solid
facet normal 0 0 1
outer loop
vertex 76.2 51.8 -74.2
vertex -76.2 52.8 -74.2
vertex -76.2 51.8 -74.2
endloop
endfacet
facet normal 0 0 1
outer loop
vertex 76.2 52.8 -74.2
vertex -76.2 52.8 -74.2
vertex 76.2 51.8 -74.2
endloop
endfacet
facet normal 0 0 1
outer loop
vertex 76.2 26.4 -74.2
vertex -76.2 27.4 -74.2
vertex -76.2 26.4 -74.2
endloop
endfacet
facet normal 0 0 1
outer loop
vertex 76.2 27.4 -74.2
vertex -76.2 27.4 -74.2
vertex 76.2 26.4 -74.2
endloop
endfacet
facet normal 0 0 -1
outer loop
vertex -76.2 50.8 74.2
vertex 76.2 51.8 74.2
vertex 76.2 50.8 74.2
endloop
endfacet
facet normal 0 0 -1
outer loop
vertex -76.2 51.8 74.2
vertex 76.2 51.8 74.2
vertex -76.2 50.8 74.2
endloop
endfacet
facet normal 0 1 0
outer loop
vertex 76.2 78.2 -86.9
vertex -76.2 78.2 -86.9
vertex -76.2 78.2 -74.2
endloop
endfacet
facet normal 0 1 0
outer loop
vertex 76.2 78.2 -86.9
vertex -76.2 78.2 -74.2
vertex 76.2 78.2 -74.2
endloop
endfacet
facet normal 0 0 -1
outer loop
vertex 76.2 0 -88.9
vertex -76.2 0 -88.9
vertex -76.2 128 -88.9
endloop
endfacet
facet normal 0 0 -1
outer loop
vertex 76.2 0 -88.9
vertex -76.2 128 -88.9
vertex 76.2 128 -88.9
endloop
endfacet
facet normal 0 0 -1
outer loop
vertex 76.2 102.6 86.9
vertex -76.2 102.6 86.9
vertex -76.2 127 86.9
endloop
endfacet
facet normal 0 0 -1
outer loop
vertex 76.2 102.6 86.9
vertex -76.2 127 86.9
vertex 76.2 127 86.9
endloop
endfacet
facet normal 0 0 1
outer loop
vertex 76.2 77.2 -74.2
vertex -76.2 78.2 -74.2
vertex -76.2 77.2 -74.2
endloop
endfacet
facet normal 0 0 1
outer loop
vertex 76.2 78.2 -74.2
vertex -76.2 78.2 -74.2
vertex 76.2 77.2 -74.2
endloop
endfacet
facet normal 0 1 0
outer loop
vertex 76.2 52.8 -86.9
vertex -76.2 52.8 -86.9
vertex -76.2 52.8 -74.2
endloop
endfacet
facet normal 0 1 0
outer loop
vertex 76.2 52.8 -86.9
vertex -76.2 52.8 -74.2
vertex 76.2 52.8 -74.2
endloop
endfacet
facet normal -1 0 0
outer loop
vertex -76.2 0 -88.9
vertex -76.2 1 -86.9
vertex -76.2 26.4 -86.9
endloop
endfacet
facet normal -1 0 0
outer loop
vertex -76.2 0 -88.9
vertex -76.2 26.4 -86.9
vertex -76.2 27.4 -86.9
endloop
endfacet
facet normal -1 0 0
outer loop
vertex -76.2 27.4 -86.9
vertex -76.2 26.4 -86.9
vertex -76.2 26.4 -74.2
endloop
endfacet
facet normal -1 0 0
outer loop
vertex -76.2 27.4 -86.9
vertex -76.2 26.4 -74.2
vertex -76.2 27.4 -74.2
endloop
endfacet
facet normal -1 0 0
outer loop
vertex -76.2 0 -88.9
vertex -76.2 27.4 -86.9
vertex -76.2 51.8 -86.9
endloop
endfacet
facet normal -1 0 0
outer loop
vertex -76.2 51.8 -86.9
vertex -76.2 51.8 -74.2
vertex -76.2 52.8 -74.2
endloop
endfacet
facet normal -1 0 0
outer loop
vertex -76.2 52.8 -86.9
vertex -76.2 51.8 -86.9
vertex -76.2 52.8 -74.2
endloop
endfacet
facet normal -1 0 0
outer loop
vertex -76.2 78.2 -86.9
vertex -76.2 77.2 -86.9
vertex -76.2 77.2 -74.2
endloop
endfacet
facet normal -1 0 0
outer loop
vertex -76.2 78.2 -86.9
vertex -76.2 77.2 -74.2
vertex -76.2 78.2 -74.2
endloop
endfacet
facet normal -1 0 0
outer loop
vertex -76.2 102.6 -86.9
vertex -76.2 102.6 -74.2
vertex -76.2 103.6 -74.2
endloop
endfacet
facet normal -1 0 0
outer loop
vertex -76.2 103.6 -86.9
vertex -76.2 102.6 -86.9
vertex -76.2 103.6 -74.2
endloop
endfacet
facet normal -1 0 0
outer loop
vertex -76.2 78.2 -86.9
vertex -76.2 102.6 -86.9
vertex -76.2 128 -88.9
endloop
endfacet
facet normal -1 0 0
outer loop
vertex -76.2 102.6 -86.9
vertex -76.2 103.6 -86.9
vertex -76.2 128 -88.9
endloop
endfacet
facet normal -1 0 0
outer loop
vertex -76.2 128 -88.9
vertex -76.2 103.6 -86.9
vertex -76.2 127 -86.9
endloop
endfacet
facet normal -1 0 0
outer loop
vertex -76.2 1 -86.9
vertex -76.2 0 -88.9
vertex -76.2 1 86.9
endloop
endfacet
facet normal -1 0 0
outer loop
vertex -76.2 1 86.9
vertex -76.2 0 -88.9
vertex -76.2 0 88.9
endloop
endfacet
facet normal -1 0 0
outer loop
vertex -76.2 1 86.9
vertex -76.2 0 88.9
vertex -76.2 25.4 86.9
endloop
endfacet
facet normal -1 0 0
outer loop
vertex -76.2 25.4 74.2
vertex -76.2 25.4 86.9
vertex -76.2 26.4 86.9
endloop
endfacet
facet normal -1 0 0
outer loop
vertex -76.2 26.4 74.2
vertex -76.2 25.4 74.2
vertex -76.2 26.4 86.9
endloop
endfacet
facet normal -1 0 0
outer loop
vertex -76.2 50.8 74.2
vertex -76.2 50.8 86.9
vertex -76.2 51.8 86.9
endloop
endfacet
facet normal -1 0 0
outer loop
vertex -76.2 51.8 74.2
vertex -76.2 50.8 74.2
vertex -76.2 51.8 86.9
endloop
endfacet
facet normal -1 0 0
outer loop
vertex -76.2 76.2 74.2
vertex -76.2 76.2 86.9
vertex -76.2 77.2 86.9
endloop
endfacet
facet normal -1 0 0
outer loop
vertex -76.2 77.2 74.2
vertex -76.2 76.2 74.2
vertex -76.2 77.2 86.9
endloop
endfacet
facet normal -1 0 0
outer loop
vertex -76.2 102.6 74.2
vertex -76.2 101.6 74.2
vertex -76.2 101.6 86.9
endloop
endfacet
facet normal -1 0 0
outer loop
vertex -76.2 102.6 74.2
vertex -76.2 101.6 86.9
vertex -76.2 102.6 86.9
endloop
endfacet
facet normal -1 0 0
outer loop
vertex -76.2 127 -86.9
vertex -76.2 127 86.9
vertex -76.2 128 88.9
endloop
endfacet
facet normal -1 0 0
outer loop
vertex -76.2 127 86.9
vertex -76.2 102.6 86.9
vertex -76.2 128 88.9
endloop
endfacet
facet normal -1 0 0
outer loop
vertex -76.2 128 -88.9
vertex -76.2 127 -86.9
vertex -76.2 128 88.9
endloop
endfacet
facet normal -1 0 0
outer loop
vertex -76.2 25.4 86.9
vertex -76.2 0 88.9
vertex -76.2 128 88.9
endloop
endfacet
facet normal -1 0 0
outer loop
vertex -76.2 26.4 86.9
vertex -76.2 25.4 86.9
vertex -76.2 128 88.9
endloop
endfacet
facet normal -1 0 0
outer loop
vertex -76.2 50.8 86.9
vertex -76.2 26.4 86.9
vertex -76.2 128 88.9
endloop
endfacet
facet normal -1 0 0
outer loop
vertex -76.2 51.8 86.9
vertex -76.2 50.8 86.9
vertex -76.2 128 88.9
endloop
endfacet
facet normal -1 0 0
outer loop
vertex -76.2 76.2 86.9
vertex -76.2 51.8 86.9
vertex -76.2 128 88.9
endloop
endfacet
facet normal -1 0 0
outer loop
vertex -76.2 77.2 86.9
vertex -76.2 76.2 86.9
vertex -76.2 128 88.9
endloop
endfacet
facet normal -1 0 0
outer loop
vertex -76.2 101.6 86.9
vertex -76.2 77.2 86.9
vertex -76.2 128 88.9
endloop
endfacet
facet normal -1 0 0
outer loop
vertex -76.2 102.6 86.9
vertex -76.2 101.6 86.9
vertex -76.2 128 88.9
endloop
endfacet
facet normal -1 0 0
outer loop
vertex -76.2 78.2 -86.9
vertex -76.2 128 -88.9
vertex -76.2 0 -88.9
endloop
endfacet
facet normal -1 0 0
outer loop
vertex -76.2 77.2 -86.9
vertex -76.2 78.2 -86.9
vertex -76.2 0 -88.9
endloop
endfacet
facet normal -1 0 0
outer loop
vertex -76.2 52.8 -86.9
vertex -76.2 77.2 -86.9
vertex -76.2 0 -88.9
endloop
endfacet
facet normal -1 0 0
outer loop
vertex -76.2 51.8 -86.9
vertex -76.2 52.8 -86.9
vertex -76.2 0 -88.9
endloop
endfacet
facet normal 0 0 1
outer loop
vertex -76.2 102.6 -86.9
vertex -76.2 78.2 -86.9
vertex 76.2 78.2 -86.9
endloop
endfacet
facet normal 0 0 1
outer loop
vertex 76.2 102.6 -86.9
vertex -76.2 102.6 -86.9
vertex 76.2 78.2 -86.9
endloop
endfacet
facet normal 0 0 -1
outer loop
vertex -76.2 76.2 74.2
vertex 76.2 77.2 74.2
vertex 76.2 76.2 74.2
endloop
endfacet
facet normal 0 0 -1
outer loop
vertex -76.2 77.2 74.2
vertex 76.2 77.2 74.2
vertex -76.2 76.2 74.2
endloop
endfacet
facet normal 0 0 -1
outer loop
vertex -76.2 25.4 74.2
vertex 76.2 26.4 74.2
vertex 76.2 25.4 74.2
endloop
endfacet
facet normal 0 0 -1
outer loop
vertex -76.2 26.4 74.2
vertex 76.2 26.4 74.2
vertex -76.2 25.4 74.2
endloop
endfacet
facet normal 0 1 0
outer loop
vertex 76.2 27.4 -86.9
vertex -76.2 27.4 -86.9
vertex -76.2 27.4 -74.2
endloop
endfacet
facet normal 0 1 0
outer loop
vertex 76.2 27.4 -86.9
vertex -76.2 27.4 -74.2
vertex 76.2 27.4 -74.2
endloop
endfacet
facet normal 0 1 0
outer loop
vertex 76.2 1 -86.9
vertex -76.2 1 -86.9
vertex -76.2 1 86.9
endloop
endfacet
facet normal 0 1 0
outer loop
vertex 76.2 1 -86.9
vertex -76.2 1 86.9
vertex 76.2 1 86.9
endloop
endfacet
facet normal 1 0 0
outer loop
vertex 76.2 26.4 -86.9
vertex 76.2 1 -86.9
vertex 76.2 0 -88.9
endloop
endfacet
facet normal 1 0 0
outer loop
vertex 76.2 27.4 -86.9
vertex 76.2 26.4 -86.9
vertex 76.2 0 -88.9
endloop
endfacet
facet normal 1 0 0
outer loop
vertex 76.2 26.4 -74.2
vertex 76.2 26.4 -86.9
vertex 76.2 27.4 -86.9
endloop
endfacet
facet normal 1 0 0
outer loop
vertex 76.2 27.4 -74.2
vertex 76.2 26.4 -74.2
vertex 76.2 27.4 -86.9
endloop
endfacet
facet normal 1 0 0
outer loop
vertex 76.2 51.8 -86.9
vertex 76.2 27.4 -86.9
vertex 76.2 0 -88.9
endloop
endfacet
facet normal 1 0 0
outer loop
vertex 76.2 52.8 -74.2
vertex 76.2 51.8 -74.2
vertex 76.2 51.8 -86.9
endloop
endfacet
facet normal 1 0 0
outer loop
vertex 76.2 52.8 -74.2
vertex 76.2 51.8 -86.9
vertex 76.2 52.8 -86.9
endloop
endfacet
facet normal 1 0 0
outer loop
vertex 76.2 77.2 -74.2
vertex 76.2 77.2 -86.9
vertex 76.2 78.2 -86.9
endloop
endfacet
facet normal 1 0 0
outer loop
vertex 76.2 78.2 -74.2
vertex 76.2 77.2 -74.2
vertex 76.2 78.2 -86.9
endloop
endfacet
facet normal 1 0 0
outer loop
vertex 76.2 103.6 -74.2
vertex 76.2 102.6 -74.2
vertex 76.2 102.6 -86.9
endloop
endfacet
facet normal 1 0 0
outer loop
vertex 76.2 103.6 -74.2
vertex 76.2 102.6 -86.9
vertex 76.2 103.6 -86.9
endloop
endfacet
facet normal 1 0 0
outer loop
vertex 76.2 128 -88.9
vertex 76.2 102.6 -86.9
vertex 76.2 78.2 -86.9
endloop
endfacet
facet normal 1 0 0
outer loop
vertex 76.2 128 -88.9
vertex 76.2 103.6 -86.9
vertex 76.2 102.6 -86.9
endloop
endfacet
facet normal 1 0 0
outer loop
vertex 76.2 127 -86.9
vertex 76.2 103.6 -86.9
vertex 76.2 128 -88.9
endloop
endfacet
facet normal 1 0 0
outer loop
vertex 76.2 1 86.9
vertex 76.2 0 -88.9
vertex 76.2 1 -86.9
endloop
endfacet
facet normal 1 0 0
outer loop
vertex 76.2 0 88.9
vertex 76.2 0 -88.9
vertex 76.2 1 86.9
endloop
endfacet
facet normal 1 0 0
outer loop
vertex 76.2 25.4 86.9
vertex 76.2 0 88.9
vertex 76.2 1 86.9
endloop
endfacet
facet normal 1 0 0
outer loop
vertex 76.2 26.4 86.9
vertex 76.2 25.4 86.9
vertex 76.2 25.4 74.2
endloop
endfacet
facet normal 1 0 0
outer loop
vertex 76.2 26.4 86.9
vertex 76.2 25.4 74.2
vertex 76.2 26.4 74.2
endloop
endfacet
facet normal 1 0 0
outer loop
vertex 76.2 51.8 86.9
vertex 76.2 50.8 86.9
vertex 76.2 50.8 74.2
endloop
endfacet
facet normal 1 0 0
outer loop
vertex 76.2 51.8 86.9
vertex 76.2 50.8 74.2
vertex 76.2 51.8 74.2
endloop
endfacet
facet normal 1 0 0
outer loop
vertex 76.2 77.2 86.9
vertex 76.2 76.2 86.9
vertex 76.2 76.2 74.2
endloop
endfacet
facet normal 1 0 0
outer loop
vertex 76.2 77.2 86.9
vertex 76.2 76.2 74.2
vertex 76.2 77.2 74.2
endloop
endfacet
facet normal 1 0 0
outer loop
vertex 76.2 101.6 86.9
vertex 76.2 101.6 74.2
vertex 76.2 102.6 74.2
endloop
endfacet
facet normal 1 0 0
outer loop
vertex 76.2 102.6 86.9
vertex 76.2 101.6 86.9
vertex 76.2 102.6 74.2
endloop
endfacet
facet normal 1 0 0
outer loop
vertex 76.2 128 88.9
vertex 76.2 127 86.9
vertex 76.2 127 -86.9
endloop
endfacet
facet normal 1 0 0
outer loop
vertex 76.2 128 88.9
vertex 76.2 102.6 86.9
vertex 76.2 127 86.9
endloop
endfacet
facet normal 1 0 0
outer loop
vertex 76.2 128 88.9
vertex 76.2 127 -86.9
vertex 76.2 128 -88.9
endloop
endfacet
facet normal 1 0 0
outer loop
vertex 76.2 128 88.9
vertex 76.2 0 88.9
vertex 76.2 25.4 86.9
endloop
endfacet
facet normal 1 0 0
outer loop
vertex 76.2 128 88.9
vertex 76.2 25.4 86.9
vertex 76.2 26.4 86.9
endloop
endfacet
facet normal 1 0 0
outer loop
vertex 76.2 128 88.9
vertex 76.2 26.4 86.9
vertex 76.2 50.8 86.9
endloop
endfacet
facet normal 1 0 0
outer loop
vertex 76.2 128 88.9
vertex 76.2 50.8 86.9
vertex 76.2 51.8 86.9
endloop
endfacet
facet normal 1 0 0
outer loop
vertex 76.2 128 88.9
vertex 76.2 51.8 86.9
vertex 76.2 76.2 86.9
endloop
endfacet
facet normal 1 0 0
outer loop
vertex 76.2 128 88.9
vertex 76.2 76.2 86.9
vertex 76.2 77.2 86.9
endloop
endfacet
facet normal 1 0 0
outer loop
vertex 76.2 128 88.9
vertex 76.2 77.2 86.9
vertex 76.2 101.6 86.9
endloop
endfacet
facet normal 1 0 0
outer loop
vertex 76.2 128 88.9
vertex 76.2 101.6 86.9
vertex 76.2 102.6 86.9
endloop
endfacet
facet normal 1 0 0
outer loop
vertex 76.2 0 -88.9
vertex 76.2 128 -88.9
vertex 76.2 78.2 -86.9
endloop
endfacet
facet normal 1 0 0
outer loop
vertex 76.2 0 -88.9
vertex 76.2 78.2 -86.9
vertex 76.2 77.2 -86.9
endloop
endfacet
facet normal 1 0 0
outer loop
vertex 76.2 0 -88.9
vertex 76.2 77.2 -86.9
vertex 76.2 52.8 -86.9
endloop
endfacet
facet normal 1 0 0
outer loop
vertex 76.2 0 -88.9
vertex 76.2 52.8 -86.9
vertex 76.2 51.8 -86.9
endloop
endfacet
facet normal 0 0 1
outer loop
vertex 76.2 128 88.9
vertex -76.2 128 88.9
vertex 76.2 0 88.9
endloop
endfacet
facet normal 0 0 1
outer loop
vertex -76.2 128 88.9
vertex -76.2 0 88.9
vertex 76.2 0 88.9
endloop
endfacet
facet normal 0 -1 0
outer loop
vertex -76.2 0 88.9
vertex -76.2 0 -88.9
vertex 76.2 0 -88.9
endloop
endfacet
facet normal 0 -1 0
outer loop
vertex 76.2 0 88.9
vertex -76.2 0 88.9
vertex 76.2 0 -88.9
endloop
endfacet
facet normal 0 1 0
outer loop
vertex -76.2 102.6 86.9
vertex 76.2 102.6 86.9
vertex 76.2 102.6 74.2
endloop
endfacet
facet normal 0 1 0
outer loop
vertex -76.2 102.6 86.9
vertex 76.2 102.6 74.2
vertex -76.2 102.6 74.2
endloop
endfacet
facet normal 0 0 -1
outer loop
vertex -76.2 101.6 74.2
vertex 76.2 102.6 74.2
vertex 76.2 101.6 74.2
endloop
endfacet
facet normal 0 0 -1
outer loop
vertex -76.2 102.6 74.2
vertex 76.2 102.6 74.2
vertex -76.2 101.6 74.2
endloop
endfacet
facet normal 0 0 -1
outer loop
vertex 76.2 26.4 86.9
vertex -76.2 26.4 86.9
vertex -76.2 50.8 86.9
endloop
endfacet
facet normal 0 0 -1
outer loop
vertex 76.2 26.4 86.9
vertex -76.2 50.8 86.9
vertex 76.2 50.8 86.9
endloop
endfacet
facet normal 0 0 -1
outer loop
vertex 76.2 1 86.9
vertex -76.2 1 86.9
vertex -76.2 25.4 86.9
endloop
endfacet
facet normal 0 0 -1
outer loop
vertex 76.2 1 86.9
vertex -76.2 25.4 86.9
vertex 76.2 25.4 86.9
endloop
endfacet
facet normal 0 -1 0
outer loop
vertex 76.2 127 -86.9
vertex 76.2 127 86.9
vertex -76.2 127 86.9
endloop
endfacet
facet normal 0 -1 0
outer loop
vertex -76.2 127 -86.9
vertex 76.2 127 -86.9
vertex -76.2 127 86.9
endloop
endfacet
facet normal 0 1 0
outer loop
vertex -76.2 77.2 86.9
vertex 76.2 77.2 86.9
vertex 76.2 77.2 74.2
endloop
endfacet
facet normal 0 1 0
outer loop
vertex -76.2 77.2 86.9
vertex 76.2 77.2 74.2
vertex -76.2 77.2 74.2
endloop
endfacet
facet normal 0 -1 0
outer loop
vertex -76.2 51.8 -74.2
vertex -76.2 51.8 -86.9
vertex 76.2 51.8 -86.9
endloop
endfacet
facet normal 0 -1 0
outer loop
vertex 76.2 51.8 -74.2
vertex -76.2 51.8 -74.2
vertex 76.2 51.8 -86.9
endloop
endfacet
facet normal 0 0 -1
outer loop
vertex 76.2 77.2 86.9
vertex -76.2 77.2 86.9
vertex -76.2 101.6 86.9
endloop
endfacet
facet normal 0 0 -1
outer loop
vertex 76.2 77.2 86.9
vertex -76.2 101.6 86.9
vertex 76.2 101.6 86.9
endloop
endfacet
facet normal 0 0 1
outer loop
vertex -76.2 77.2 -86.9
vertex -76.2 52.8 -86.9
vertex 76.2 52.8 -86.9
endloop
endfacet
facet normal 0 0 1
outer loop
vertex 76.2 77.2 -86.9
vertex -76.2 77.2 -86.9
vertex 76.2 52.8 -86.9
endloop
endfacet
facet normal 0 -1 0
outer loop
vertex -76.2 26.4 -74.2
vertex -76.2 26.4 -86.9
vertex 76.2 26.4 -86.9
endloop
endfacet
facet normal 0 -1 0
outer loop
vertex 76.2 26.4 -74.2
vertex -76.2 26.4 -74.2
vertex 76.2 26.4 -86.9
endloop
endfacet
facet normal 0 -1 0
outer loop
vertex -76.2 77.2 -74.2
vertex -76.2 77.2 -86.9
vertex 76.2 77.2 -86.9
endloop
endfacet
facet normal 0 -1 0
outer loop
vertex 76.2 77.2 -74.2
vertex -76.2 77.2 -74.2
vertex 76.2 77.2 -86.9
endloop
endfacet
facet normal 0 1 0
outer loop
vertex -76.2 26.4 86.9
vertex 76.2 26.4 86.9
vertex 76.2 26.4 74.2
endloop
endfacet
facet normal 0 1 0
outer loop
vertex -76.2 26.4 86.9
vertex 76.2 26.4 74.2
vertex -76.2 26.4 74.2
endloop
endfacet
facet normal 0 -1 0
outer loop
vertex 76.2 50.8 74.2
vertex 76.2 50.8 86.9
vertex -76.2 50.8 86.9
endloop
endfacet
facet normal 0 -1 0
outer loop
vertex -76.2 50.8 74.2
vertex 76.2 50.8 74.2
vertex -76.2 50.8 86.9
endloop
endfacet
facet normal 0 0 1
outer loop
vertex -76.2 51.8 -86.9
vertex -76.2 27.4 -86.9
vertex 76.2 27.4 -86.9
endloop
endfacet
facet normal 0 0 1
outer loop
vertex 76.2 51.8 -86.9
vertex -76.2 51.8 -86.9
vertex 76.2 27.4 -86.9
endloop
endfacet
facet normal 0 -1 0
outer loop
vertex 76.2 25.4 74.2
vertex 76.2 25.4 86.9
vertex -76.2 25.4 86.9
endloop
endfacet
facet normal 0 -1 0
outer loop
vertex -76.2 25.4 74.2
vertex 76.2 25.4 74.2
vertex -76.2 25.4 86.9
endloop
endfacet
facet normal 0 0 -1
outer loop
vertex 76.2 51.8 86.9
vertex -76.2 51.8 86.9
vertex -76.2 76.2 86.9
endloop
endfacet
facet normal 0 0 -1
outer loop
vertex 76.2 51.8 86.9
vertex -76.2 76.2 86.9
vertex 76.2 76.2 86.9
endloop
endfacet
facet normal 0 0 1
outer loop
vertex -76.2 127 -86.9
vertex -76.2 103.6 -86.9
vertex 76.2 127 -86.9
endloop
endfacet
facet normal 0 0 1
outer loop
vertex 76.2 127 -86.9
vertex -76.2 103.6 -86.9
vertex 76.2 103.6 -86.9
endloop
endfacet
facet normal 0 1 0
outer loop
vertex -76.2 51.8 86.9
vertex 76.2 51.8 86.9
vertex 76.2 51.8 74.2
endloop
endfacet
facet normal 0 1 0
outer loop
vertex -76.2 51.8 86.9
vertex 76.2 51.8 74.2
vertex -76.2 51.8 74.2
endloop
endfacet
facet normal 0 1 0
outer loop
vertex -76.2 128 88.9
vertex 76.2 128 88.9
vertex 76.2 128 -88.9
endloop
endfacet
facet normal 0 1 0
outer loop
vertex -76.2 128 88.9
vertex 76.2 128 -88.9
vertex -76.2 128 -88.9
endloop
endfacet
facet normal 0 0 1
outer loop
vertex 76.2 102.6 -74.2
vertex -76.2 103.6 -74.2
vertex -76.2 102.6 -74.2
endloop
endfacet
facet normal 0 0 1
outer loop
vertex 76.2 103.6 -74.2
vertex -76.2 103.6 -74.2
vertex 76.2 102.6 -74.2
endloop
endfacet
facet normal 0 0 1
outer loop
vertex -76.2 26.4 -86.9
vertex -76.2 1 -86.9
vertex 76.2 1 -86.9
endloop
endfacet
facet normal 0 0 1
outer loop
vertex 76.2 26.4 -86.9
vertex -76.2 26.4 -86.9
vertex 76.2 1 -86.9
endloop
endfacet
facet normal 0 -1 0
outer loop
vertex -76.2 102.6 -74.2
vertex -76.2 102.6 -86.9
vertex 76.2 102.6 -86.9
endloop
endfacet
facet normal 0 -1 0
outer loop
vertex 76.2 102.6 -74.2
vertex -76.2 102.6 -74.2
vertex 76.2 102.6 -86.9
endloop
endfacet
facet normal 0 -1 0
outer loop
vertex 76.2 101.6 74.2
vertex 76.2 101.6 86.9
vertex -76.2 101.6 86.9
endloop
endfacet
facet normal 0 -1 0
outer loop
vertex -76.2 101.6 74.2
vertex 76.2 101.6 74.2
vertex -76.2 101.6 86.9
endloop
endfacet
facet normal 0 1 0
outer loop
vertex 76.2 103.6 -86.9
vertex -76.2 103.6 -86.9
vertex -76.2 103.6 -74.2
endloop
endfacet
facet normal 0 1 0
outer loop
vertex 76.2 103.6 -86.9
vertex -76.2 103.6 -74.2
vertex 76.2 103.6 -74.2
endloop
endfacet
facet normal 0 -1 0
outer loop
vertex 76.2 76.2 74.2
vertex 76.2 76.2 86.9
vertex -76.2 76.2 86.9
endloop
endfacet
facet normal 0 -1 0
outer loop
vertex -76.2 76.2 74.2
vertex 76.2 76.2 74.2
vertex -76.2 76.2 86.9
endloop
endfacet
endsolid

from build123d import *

# Parameters (mm, degrees)
SKETCH1_W           = 152.4
SKETCH1_H           = 177.8
BOSS_EXTRUDE1_DEPTH = 1
SKETCH15_W          = 152.4
SKETCH15_H          = 2
EXTRUDE_THIN1_DEPTH = 127
SKETCH16_W          = 152.4
SKETCH16_H          = 1
EXTRUDE_THIN2_DEPTH = 12.7
SKETCH17_W          = 152.4
SKETCH17_H          = 1
EXTRUDE_THIN3_DEPTH = 12.7
SKETCH18_W          = 152.4
SKETCH18_H          = 1
EXTRUDE_THIN4_DEPTH = 173.8


with BuildPart() as part:
    # Sketch1 → Boss-Extrude1 (new body)
    with BuildSketch(Plane(origin=(0, 0, 0), x_dir=(1, 0, 0), z_dir=(0, 1, 0))):
        Rectangle(SKETCH1_W, SKETCH1_H)
    extrude(amount=BOSS_EXTRUDE1_DEPTH)

    # Sketch15 → Extrude-Thin1 (add)
    with BuildSketch(Plane(origin=(0, 1, 0), x_dir=(1, 0, 0), z_dir=(0, 1, 0))):
        with Locations((0, -87.9)):
            Rectangle(SKETCH15_W, SKETCH15_H)
        with Locations((0, 87.9)):
            Rectangle(SKETCH15_W, SKETCH15_H)
    extrude(amount=EXTRUDE_THIN1_DEPTH)

    # Sketch16 → Extrude-Thin2 (add)
    with BuildSketch(Plane(origin=(0, 0, 86.9), x_dir=(-1, 0, 0), z_dir=(0, 0, -1))):
        with Locations((0, 25.9)):
            Rectangle(SKETCH16_W, SKETCH16_H)
        with Locations((0, 51.3)):
            Rectangle(SKETCH16_W, SKETCH16_H)
        with Locations((0, 76.7)):
            Rectangle(SKETCH16_W, SKETCH16_H)
        with Locations((0, 102.1)):
            Rectangle(SKETCH16_W, SKETCH16_H)
    extrude(amount=EXTRUDE_THIN2_DEPTH)

    # Sketch17 → Extrude-Thin3 (add)
    with BuildSketch(Plane.XY.offset(-86.9)):
        with Locations((0, 26.9)):
            Rectangle(SKETCH17_W, SKETCH17_H)
        with Locations((0, 52.3)):
            Rectangle(SKETCH17_W, SKETCH17_H)
        with Locations((0, 77.7)):
            Rectangle(SKETCH17_W, SKETCH17_H)
        with Locations((0, 103.1)):
            Rectangle(SKETCH17_W, SKETCH17_H)
    extrude(amount=EXTRUDE_THIN3_DEPTH)

    # Sketch18 → Extrude-Thin4 (add)
    with BuildSketch(Plane(origin=(0, 0, 86.9), x_dir=(-1, 0, 0), z_dir=(0, 0, -1))):
        with Locations((0, 127.5)):
            Rectangle(SKETCH18_W, SKETCH18_H)
    extrude(amount=EXTRUDE_THIN4_DEPTH)


solid = part.part
